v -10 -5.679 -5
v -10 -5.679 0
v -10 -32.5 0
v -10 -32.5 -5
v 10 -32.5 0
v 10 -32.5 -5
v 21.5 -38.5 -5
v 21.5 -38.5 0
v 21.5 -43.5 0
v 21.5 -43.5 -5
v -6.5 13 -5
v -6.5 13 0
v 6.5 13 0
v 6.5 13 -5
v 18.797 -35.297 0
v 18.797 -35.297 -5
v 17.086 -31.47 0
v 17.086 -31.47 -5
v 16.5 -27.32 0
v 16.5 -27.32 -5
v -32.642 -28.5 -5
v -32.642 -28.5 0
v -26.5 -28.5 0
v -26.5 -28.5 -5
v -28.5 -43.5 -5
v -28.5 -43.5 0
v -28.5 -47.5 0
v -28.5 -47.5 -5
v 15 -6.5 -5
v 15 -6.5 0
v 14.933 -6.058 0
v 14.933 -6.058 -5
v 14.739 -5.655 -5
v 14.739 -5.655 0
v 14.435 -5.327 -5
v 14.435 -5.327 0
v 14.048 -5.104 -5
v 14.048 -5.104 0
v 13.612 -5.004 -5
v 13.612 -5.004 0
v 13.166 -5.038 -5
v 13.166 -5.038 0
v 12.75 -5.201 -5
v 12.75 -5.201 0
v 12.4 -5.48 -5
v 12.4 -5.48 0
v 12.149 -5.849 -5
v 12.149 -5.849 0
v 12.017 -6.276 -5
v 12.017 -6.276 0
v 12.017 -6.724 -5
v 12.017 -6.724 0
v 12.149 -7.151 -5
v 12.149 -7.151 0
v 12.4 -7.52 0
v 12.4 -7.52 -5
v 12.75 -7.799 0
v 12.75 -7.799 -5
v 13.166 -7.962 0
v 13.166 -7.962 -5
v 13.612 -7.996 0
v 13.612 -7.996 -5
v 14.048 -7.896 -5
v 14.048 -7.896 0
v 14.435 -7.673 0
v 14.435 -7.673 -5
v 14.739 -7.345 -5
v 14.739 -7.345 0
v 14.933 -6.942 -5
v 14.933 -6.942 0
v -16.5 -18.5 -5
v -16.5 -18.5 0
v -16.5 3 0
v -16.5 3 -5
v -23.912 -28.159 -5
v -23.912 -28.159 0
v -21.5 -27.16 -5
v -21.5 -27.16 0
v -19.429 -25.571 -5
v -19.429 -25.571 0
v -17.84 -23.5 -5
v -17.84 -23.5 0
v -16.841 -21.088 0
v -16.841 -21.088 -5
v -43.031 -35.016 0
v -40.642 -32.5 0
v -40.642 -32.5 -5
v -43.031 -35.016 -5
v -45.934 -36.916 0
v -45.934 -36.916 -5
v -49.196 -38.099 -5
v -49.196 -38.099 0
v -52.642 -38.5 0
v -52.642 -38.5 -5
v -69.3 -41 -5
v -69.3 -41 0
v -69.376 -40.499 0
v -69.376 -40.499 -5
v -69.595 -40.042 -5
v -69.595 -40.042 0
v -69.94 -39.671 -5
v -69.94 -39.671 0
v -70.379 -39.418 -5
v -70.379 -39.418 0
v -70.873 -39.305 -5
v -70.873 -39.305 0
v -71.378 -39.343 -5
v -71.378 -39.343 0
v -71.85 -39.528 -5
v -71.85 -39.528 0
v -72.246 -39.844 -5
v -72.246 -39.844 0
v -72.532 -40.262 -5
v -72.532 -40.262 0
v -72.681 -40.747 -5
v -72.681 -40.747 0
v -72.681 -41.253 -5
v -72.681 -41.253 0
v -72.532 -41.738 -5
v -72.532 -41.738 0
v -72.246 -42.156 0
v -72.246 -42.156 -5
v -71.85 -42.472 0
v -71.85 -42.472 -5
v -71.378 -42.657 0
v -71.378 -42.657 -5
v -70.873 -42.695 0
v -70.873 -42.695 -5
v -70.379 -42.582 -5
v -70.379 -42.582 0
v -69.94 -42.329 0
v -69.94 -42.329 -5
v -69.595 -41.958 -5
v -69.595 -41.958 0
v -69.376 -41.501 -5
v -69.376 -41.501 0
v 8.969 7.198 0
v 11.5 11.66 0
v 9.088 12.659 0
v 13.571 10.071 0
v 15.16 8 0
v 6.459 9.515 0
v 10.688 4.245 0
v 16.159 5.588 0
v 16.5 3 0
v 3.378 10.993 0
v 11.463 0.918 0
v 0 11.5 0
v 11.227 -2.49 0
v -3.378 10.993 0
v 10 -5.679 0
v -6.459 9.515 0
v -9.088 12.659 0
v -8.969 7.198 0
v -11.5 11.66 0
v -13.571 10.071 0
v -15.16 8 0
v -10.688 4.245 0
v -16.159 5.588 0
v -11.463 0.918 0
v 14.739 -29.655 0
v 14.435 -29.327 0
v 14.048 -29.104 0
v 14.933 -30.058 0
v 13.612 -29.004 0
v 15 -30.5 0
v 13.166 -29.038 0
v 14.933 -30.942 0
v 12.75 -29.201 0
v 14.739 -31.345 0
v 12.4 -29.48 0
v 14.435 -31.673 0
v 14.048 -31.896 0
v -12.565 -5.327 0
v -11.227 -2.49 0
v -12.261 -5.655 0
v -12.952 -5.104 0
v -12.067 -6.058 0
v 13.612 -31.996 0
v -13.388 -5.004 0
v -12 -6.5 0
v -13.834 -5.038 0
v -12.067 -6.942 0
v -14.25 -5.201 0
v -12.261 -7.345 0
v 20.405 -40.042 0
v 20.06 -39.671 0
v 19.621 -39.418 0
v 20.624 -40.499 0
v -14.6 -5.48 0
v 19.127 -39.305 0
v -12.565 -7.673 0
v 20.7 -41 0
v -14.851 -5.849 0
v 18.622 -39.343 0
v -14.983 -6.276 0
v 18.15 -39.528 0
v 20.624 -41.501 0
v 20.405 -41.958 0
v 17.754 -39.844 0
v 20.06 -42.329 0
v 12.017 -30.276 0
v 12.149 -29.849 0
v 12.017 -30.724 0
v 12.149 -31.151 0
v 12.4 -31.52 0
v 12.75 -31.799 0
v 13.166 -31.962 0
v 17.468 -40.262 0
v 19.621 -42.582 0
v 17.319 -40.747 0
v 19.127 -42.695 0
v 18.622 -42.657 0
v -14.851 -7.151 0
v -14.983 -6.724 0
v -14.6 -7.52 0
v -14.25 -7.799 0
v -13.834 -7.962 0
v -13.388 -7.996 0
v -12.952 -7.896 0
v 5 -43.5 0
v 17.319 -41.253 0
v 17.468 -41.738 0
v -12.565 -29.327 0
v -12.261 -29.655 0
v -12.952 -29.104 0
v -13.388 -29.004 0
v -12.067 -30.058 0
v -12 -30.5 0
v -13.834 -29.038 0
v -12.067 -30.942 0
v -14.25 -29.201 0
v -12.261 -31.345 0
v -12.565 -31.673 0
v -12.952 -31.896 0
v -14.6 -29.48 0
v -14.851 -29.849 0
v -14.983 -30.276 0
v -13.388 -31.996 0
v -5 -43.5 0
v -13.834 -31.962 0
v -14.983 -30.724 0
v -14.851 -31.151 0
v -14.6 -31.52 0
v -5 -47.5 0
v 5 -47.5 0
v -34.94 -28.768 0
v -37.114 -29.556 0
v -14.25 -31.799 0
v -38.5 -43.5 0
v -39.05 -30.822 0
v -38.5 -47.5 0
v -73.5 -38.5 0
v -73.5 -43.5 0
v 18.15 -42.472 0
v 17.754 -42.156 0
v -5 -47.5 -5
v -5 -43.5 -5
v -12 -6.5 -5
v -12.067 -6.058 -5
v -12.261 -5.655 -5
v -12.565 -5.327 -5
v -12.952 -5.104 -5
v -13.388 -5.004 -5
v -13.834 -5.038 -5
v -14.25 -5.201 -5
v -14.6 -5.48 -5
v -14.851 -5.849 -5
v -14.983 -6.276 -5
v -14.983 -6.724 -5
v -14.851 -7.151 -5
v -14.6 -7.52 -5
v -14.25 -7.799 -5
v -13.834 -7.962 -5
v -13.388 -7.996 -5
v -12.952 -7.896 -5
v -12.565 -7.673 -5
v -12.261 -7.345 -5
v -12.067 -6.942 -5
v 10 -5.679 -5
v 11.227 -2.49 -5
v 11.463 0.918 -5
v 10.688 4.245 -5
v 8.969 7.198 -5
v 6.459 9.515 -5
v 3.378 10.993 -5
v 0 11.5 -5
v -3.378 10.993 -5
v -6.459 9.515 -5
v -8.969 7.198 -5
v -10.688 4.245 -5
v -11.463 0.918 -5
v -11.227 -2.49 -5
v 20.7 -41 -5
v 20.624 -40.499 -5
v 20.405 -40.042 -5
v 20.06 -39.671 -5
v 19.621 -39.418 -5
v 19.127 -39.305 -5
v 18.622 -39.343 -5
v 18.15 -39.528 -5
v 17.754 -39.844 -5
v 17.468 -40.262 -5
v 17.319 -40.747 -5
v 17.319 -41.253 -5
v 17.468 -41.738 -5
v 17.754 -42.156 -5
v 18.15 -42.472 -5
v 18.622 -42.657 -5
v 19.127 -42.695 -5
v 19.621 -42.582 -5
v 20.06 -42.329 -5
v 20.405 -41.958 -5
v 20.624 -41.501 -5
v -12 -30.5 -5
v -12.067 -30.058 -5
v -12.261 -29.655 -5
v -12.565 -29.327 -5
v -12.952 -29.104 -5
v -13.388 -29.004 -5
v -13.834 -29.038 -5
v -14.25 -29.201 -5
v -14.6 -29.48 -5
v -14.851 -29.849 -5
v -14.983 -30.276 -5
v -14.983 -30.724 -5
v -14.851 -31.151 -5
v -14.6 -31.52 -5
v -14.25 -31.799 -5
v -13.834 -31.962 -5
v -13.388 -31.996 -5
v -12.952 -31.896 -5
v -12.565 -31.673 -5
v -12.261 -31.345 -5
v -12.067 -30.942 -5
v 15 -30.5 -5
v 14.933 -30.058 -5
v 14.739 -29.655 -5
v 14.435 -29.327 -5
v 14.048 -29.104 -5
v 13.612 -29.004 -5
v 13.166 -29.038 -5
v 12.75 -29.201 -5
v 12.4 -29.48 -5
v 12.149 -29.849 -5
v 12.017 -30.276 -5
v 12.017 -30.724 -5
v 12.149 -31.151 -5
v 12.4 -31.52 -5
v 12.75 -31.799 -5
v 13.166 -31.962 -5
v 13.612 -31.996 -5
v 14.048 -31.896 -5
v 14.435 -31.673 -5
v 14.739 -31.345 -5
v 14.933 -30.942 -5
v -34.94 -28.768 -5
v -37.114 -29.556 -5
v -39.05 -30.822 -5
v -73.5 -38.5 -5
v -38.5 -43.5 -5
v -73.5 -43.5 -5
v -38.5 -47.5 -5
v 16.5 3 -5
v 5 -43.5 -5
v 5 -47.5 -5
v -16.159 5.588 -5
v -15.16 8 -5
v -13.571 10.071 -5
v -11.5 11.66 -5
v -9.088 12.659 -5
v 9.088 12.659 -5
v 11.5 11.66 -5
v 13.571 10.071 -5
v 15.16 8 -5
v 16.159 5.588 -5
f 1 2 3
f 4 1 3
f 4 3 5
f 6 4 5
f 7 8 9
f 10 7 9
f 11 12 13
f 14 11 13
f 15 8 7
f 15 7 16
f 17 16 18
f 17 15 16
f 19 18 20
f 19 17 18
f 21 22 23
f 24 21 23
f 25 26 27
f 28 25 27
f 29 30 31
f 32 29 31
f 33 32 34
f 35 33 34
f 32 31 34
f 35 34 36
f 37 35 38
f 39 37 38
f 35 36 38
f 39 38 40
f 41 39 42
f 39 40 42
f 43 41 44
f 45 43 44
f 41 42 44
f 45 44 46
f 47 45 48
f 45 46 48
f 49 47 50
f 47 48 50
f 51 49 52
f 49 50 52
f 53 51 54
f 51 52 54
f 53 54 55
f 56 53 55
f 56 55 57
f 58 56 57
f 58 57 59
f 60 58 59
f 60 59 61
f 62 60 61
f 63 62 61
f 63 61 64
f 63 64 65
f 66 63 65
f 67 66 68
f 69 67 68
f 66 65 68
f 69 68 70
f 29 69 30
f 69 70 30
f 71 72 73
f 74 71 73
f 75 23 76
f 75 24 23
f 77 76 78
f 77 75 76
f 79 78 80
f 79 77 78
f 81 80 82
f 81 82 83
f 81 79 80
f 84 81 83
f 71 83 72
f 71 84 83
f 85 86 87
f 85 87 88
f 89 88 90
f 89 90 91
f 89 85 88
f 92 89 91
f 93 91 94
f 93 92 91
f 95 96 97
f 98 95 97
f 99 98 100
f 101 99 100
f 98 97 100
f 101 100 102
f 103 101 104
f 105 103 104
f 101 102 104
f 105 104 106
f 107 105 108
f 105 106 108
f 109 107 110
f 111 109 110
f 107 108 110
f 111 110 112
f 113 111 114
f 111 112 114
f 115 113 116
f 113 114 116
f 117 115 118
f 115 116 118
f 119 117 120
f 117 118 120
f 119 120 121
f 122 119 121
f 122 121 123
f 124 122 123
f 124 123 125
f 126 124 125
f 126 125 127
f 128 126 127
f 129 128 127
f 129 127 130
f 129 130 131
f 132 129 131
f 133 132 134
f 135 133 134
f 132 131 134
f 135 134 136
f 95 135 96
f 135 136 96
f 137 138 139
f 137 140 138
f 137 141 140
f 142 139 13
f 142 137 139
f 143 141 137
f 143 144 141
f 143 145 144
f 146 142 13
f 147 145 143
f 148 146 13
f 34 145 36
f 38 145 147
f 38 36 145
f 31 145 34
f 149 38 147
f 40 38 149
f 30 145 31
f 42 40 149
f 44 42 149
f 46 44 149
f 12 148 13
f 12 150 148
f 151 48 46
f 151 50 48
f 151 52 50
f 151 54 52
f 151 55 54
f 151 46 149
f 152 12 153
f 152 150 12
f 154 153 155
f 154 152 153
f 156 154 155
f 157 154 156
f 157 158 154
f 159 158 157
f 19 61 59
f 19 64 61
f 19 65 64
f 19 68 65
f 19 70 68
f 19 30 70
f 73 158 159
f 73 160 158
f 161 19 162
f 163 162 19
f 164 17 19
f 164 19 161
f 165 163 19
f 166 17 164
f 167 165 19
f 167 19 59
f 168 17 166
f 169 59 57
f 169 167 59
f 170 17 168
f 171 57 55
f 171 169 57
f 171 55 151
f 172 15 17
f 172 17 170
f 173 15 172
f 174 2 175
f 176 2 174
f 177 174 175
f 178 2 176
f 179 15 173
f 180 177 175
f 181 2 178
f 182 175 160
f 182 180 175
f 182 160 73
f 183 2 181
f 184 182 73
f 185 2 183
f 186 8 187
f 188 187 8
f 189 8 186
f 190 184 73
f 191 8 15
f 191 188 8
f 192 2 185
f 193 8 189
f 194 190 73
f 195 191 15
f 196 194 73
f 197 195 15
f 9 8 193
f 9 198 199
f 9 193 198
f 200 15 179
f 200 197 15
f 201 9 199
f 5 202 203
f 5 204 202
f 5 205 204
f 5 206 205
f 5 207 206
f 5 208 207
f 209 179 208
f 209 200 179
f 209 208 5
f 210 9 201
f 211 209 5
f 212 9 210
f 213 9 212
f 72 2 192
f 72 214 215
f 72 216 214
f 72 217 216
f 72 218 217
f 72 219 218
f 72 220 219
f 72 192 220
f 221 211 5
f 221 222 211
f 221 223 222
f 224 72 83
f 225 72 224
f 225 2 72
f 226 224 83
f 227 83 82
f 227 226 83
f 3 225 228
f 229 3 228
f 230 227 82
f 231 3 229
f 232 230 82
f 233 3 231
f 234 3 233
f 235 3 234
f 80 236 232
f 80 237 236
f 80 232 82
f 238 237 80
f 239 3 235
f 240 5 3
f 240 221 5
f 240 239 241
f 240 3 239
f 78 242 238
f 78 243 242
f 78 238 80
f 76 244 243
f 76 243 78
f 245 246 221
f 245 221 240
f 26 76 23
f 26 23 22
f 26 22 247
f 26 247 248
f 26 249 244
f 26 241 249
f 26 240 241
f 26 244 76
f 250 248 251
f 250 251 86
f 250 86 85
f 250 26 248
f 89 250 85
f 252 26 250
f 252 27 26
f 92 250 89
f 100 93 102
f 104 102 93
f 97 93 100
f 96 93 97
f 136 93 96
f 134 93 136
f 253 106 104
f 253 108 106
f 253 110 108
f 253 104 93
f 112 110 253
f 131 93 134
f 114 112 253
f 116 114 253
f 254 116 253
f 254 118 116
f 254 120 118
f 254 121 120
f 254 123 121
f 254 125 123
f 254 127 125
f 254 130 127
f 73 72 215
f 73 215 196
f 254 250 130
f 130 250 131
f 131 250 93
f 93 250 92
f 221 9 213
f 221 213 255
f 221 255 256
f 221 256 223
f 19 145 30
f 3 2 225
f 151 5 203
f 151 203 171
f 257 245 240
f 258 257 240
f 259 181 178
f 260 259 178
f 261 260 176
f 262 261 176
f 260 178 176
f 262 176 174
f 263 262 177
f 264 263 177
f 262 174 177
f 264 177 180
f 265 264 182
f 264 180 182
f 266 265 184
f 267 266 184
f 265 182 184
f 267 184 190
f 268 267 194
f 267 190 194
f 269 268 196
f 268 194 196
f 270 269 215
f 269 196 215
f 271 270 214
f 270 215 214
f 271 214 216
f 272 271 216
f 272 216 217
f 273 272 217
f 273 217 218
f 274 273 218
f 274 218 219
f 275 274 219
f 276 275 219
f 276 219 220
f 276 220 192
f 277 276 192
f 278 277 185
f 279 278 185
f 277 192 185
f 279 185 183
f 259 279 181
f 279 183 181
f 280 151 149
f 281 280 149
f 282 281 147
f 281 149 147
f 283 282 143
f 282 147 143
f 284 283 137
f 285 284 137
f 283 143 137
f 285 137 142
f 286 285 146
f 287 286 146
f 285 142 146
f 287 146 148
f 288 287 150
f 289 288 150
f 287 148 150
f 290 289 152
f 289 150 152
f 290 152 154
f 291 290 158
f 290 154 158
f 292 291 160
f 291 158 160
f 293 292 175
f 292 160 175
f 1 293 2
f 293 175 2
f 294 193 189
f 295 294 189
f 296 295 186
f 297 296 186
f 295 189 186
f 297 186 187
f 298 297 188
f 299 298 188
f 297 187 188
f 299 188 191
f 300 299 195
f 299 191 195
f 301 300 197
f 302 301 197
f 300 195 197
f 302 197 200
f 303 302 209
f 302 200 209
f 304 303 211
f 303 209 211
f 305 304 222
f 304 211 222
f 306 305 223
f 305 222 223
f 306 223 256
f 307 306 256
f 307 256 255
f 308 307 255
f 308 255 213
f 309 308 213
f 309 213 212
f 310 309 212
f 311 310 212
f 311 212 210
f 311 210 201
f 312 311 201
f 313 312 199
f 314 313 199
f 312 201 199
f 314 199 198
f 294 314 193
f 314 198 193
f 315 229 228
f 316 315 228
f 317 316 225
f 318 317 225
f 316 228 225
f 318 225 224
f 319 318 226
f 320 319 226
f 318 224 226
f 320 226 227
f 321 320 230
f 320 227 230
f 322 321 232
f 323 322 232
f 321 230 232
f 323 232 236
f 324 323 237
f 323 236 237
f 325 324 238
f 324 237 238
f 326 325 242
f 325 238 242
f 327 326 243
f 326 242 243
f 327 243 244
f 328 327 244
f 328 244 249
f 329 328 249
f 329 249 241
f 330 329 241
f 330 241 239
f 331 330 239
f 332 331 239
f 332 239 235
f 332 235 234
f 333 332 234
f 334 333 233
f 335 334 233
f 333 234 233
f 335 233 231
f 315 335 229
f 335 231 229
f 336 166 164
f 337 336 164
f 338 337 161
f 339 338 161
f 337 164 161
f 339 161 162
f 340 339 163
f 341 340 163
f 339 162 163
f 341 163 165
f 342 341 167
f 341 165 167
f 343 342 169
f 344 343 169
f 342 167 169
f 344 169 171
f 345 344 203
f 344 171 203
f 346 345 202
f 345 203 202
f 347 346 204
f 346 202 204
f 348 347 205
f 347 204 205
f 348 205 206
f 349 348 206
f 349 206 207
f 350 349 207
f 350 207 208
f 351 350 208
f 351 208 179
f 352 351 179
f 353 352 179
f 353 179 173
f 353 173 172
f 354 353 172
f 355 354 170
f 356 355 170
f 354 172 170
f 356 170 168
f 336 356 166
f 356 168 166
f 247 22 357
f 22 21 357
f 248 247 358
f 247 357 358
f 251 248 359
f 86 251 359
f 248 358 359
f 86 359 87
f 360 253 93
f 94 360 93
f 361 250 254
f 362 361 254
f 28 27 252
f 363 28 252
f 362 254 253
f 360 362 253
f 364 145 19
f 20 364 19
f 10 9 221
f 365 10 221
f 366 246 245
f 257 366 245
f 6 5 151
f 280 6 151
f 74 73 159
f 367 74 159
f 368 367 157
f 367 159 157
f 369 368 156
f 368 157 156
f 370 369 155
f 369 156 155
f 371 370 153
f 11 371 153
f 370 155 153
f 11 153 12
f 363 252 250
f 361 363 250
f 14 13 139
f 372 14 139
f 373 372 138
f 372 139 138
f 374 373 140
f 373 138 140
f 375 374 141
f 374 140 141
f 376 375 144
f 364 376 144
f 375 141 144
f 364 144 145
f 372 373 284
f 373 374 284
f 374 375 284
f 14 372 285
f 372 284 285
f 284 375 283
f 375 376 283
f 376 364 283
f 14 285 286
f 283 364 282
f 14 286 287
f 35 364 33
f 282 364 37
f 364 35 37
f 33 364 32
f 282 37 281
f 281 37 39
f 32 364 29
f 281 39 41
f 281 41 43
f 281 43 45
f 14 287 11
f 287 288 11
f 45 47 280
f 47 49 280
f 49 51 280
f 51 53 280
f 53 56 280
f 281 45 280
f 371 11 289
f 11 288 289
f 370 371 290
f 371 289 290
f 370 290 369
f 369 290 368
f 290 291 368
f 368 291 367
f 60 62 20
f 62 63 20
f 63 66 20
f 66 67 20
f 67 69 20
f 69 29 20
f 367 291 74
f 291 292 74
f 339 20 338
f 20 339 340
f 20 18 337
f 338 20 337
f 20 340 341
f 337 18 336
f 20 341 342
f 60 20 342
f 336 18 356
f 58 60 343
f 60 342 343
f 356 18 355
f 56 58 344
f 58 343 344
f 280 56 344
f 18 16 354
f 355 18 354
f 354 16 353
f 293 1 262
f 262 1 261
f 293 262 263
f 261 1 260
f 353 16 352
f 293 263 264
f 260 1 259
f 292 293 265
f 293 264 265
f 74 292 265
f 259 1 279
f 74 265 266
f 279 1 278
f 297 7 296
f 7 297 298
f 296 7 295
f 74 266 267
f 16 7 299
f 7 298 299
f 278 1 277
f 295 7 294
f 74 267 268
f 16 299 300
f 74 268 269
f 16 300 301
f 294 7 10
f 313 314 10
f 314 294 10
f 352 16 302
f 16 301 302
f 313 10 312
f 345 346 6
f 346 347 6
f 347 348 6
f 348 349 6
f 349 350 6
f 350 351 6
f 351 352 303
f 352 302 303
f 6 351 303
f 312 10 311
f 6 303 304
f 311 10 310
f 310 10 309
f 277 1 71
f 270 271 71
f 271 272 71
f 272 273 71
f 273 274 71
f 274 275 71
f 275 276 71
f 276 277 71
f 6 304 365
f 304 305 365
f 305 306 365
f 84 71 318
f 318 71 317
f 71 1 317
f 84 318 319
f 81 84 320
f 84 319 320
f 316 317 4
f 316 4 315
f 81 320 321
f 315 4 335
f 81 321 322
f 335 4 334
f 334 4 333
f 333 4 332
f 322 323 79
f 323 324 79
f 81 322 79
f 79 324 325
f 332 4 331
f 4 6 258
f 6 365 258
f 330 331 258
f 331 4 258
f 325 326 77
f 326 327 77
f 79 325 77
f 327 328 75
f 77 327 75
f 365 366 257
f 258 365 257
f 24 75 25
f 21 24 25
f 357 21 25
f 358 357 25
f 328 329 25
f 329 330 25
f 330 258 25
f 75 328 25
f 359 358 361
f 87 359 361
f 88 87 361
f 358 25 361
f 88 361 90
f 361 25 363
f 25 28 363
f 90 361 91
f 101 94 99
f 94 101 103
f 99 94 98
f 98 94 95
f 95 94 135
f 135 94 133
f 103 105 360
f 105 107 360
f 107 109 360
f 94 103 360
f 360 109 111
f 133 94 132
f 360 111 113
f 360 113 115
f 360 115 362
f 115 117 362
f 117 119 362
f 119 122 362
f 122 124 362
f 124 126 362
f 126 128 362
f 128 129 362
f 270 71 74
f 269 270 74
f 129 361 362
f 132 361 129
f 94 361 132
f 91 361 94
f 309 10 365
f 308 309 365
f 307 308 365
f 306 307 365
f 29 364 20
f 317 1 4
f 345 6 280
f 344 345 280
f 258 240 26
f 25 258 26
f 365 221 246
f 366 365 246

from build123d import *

# Parameters (mm, degrees)
SKETCH2_R          = 1.5
SKETCH2_R_2        = 1.7
BASE_FLANGE1_DEPTH = 5
FILLET1_R          = 15
FILLET2_R          = 10


# Sheet-metal steps are written as plain solids
with BuildPart() as part:
    # Sketch2 → Base-Flange1 (new body)
    with BuildSketch(Plane.XY):
        with BuildLine():
            Line((-6.5, 13), (6.5, 13))
            ThreePointArc((6.5, 13), (13.571067812, 10.071067812), (16.5, 3))
            Line((16.5, 3), (16.5, -38.5))
            Line((16.5, -38.5), (21.5, -38.5))
            Line((21.5, -38.5), (21.5, -43.5))
            Line((21.5, -43.5), (16.5, -43.5))
            Line((16.5, -43.5), (5, -43.5))
            Line((5, -43.5), (5, -47.5))
            Line((5, -47.5), (-5, -47.5))
            Line((-5, -47.5), (-5, -43.5))
            Line((-5, -43.5), (-28.5, -43.5))
            Line((-28.5, -43.5), (-28.5, -47.5))
            Line((-28.5, -47.5), (-38.5, -47.5))
            Line((-38.5, -47.5), (-38.5, -43.5))
            Line((-38.5, -43.5), (-73.5, -43.5))
            Line((-73.5, -43.5), (-73.5, -38.5))
            Line((-73.5, -38.5), (-38.5, -38.5))
            Line((-38.5, -38.5), (-38.5, -28.5))
            Line((-38.5, -28.5), (-16.5, -28.5))
            Line((-16.5, -28.5), (-16.5, 3))
            ThreePointArc((-16.5, 3), (-13.571067812, 10.071067812), (-6.5, 13))
        make_face()
        with Locations((-13.5, -6.5)):
            Circle(SKETCH2_R, mode=Mode.SUBTRACT)
        with Locations((-13.5, -30.5)):
            Circle(SKETCH2_R, mode=Mode.SUBTRACT)
        with Locations((13.5, -6.5)):
            Circle(SKETCH2_R, mode=Mode.SUBTRACT)
        with Locations((13.5, -30.5)):
            Circle(SKETCH2_R, mode=Mode.SUBTRACT)
        with Locations((19, -41)):
            Circle(SKETCH2_R_2, mode=Mode.SUBTRACT)
        with Locations((-71, -41)):
            Circle(SKETCH2_R_2, mode=Mode.SUBTRACT)
        with BuildLine():
            Line((-10, -5.678908346), (-10, -32.5))
            Line((-10, -32.5), (10, -32.5))
            Line((10, -32.5), (10, -5.678908346))
            ThreePointArc((10, -5.678908346), (0, 11.5), (-10, -5.678908346))
        make_face(mode=Mode.SUBTRACT)
    extrude(amount=-BASE_FLANGE1_DEPTH)

    # Fillet1
    # the kernel refuses this fillet: 15 mm, written as the material it adds along each edge
    with BuildSketch(Plane(origin=(-38.5, -38.5, 0), x_dir=(0, 1, 0), z_dir=(0, 0, -1))) as fillet1_piece_1:
        with BuildLine():
            CenterArc((15, -14.142135624), FILLET1_R, 109.471220634, 70.528779366)
            Line((0, -14.142135624), (-0.3, -14.142135624))
            Line((-0.3, -14.142135624), (-0.3, 0))
            Line((-0.3, 0), (0, 0.3))
            ThreePointArc((0, 0.3), (5, 0.3), (9.9, 0.282842712))
            Line((9.9, 0.282842712), (10, 0))
        make_face()
    extrude(amount=5)
    with BuildSketch(Plane(origin=(16.5, -38.5, 0), x_dir=(1, 0, 0), z_dir=(0, 0, -1))) as fillet1_piece_2:
        with BuildLine():
            CenterArc((15, -11.180339887), FILLET1_R, 131.810314896, 48.189685104)
            Line((0, -11.180339887), (-0.3, -11.180339887))
            Line((-0.3, -11.180339887), (-0.3, 0))
            Line((-0.3, 0), (0, 0.3))
            ThreePointArc((0, 0.3), (2.5, 0.3), (4.8, 0.223606798))
            Line((4.8, 0.223606798), (5, 0))
        make_face()
    extrude(amount=5)

    # Fillet2
    fillet2_edges = [part.edges().sort_by_distance(p)[0] for p in [
        (-38.5, -28.5, -2.5),
        (-16.5, -28.5, -2.5),
    ]]
    fillet(fillet2_edges, radius=FILLET2_R)


solid = part.part
